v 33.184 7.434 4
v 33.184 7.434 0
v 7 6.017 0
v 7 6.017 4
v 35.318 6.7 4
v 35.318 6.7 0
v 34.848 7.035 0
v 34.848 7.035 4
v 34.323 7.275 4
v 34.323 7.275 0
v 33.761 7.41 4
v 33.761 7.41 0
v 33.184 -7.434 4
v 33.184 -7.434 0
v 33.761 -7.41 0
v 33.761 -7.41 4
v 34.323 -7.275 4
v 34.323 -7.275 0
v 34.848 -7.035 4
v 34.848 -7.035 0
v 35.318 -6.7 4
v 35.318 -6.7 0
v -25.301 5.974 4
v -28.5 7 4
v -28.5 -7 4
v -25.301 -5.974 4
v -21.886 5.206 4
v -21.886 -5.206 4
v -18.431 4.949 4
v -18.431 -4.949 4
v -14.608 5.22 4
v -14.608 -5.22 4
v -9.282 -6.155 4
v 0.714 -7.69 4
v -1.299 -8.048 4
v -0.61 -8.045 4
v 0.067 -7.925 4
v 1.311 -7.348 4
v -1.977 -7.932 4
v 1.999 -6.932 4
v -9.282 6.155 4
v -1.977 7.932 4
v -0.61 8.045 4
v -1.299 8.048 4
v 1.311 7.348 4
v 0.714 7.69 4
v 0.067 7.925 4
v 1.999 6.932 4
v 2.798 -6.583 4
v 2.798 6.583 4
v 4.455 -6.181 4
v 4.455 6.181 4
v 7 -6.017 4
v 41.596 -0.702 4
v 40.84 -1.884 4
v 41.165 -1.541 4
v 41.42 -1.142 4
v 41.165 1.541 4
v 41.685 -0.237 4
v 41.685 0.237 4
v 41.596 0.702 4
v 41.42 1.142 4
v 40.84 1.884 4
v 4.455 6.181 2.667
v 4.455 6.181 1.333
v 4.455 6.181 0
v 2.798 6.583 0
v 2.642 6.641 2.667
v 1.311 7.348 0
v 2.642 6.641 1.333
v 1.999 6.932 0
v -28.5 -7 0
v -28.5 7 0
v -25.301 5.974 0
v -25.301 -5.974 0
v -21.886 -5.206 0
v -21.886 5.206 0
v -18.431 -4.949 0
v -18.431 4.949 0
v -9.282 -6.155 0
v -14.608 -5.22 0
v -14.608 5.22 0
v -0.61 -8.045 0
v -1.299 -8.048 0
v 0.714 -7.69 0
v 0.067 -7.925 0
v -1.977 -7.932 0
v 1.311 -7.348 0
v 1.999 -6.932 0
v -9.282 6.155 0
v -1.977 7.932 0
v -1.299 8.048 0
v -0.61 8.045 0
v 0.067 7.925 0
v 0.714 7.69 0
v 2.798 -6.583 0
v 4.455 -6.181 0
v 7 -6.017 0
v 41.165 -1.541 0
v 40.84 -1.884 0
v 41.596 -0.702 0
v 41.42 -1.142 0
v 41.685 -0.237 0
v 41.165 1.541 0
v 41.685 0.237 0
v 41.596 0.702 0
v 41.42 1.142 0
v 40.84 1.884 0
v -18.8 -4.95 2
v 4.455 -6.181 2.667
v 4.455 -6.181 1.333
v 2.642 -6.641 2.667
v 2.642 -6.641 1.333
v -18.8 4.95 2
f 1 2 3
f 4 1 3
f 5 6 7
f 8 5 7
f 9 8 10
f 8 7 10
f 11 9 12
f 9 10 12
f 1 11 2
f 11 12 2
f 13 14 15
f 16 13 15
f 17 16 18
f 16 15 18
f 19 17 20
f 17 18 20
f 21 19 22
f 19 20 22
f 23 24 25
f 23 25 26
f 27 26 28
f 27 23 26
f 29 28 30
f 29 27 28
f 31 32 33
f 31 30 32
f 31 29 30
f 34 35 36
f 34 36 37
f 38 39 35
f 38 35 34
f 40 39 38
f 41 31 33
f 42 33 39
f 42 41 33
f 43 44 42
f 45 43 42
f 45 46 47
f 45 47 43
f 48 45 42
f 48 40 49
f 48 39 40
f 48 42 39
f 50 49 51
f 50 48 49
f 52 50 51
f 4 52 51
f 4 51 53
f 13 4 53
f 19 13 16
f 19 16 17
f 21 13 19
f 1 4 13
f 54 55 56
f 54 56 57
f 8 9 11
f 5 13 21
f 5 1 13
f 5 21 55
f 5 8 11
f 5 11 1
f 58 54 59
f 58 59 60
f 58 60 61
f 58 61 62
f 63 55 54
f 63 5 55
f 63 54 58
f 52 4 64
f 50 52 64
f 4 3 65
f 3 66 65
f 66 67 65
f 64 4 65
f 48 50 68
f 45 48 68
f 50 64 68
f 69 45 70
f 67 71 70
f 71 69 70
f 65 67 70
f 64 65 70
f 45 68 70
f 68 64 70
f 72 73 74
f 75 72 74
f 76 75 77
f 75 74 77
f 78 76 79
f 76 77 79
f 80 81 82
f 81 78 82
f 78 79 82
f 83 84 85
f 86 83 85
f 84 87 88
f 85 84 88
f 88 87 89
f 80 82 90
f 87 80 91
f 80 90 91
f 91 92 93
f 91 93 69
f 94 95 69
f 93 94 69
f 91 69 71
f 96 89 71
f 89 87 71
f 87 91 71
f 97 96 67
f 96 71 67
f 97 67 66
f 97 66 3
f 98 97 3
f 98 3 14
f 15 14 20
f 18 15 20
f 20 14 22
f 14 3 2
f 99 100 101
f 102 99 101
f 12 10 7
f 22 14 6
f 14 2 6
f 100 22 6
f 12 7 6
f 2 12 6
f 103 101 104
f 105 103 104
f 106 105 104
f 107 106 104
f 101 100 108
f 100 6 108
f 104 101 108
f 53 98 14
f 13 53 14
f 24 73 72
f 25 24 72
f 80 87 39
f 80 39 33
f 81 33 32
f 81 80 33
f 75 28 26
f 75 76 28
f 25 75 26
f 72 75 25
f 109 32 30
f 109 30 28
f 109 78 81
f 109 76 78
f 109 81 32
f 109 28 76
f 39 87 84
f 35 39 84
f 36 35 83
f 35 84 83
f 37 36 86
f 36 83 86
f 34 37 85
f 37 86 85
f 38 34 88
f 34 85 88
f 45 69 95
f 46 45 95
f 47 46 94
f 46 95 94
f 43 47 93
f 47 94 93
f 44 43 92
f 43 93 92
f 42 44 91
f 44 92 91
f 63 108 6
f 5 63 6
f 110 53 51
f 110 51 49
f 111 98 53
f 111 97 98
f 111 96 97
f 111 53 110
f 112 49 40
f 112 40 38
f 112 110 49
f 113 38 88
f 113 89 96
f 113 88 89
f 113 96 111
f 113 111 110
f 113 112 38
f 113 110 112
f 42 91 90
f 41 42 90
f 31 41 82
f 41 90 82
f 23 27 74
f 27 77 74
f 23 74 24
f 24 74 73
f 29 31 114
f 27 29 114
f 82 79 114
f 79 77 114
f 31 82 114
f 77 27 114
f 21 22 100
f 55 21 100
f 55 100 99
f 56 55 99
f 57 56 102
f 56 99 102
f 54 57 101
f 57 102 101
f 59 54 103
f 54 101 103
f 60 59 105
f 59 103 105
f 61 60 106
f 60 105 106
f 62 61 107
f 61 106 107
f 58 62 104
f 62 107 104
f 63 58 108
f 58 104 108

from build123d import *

# Parameters (mm, degrees)
F1_DEPTH = 4


with BuildPart() as f1:
    # F0 (on Top) → F1 (new body)
    with BuildSketch(Plane.XY):
        with BuildLine():
            Line((33.1839122816, 7.4341704185), (7, 6.0167759657))
            add(Edge.make_bspline(
                [(7, 6.0167759657), (4.0042999393, 6.0167759657), (2.4851097846, 6.5339730516), (1.3114110288, 7.3480597034)],
                knots=[0, 0, 0, 0, 5.2976431113, 5.2976431113, 5.2976431113, 5.2976431113], degree=3))
            ThreePointArc((1.3114110288, 7.3480597034), (-0.2690563082, 7.9996972089), (-1.9772483015, 7.9319583269))
            add(Edge.make_bspline(
                [(-1.9772483015, 7.9319583269), (-8.0874424423, 6.3392692714), (-18.8504021756, 3.7391038399), (-25.5343435285, 5.9978133829), (-28.5, 7)],
                knots=[0.0565322181, 0.0565322181, 0.0565322181, 0.0565322181, 0.5813845177, 1, 1, 1, 1], degree=3))
            Line((-28.5, 7), (-28.5, 0))
            Line((-28.5, 0), (-28.5, -7))
            add(Edge.make_bspline(
                [(-1.9772483015, -7.9319583269), (-8.0874424423, -6.3392692714), (-18.8504021756, -3.7391038399), (-25.5343435285, -5.9978133829), (-28.5, -7)],
                knots=[0.0565322181, 0.0565322181, 0.0565322181, 0.0565322181, 0.5813845177, 1, 1, 1, 1], degree=3))
            ThreePointArc((-1.9772483015, -7.9319583269), (-0.2690563082, -7.9996972089), (1.3114110288, -7.3480597034))
            add(Edge.make_bspline(
                [(7, -6.0167759657), (4.0042999393, -6.0167759657), (2.4851097846, -6.5339730516), (1.3114110288, -7.3480597034)],
                knots=[0, 0, 0, 0, 5.2976431113, 5.2976431113, 5.2976431113, 5.2976431113], degree=3))
            Line((7, -6.0167759657), (33.1839122816, -7.4341704185))
            ThreePointArc((33.1839122816, -7.4341704185), (34.3226011035, -7.2751722198), (35.3178602471, -6.6995404822))
            Line((35.3178602471, -6.6995404822), (40.8395039416, -1.8841535393))
            ThreePointArc((40.8395039416, -1.8841535393), (41.6963467853, 0), (40.8395039416, 1.8841535393))
            Line((40.8395039416, 1.8841535393), (35.3178602471, 6.6995404822))
            ThreePointArc((35.3178602471, 6.6995404822), (34.3226011035, 7.2751722198), (33.1839122816, 7.4341704185))
        make_face()
    extrude(amount=F1_DEPTH)


solid = f1.part
